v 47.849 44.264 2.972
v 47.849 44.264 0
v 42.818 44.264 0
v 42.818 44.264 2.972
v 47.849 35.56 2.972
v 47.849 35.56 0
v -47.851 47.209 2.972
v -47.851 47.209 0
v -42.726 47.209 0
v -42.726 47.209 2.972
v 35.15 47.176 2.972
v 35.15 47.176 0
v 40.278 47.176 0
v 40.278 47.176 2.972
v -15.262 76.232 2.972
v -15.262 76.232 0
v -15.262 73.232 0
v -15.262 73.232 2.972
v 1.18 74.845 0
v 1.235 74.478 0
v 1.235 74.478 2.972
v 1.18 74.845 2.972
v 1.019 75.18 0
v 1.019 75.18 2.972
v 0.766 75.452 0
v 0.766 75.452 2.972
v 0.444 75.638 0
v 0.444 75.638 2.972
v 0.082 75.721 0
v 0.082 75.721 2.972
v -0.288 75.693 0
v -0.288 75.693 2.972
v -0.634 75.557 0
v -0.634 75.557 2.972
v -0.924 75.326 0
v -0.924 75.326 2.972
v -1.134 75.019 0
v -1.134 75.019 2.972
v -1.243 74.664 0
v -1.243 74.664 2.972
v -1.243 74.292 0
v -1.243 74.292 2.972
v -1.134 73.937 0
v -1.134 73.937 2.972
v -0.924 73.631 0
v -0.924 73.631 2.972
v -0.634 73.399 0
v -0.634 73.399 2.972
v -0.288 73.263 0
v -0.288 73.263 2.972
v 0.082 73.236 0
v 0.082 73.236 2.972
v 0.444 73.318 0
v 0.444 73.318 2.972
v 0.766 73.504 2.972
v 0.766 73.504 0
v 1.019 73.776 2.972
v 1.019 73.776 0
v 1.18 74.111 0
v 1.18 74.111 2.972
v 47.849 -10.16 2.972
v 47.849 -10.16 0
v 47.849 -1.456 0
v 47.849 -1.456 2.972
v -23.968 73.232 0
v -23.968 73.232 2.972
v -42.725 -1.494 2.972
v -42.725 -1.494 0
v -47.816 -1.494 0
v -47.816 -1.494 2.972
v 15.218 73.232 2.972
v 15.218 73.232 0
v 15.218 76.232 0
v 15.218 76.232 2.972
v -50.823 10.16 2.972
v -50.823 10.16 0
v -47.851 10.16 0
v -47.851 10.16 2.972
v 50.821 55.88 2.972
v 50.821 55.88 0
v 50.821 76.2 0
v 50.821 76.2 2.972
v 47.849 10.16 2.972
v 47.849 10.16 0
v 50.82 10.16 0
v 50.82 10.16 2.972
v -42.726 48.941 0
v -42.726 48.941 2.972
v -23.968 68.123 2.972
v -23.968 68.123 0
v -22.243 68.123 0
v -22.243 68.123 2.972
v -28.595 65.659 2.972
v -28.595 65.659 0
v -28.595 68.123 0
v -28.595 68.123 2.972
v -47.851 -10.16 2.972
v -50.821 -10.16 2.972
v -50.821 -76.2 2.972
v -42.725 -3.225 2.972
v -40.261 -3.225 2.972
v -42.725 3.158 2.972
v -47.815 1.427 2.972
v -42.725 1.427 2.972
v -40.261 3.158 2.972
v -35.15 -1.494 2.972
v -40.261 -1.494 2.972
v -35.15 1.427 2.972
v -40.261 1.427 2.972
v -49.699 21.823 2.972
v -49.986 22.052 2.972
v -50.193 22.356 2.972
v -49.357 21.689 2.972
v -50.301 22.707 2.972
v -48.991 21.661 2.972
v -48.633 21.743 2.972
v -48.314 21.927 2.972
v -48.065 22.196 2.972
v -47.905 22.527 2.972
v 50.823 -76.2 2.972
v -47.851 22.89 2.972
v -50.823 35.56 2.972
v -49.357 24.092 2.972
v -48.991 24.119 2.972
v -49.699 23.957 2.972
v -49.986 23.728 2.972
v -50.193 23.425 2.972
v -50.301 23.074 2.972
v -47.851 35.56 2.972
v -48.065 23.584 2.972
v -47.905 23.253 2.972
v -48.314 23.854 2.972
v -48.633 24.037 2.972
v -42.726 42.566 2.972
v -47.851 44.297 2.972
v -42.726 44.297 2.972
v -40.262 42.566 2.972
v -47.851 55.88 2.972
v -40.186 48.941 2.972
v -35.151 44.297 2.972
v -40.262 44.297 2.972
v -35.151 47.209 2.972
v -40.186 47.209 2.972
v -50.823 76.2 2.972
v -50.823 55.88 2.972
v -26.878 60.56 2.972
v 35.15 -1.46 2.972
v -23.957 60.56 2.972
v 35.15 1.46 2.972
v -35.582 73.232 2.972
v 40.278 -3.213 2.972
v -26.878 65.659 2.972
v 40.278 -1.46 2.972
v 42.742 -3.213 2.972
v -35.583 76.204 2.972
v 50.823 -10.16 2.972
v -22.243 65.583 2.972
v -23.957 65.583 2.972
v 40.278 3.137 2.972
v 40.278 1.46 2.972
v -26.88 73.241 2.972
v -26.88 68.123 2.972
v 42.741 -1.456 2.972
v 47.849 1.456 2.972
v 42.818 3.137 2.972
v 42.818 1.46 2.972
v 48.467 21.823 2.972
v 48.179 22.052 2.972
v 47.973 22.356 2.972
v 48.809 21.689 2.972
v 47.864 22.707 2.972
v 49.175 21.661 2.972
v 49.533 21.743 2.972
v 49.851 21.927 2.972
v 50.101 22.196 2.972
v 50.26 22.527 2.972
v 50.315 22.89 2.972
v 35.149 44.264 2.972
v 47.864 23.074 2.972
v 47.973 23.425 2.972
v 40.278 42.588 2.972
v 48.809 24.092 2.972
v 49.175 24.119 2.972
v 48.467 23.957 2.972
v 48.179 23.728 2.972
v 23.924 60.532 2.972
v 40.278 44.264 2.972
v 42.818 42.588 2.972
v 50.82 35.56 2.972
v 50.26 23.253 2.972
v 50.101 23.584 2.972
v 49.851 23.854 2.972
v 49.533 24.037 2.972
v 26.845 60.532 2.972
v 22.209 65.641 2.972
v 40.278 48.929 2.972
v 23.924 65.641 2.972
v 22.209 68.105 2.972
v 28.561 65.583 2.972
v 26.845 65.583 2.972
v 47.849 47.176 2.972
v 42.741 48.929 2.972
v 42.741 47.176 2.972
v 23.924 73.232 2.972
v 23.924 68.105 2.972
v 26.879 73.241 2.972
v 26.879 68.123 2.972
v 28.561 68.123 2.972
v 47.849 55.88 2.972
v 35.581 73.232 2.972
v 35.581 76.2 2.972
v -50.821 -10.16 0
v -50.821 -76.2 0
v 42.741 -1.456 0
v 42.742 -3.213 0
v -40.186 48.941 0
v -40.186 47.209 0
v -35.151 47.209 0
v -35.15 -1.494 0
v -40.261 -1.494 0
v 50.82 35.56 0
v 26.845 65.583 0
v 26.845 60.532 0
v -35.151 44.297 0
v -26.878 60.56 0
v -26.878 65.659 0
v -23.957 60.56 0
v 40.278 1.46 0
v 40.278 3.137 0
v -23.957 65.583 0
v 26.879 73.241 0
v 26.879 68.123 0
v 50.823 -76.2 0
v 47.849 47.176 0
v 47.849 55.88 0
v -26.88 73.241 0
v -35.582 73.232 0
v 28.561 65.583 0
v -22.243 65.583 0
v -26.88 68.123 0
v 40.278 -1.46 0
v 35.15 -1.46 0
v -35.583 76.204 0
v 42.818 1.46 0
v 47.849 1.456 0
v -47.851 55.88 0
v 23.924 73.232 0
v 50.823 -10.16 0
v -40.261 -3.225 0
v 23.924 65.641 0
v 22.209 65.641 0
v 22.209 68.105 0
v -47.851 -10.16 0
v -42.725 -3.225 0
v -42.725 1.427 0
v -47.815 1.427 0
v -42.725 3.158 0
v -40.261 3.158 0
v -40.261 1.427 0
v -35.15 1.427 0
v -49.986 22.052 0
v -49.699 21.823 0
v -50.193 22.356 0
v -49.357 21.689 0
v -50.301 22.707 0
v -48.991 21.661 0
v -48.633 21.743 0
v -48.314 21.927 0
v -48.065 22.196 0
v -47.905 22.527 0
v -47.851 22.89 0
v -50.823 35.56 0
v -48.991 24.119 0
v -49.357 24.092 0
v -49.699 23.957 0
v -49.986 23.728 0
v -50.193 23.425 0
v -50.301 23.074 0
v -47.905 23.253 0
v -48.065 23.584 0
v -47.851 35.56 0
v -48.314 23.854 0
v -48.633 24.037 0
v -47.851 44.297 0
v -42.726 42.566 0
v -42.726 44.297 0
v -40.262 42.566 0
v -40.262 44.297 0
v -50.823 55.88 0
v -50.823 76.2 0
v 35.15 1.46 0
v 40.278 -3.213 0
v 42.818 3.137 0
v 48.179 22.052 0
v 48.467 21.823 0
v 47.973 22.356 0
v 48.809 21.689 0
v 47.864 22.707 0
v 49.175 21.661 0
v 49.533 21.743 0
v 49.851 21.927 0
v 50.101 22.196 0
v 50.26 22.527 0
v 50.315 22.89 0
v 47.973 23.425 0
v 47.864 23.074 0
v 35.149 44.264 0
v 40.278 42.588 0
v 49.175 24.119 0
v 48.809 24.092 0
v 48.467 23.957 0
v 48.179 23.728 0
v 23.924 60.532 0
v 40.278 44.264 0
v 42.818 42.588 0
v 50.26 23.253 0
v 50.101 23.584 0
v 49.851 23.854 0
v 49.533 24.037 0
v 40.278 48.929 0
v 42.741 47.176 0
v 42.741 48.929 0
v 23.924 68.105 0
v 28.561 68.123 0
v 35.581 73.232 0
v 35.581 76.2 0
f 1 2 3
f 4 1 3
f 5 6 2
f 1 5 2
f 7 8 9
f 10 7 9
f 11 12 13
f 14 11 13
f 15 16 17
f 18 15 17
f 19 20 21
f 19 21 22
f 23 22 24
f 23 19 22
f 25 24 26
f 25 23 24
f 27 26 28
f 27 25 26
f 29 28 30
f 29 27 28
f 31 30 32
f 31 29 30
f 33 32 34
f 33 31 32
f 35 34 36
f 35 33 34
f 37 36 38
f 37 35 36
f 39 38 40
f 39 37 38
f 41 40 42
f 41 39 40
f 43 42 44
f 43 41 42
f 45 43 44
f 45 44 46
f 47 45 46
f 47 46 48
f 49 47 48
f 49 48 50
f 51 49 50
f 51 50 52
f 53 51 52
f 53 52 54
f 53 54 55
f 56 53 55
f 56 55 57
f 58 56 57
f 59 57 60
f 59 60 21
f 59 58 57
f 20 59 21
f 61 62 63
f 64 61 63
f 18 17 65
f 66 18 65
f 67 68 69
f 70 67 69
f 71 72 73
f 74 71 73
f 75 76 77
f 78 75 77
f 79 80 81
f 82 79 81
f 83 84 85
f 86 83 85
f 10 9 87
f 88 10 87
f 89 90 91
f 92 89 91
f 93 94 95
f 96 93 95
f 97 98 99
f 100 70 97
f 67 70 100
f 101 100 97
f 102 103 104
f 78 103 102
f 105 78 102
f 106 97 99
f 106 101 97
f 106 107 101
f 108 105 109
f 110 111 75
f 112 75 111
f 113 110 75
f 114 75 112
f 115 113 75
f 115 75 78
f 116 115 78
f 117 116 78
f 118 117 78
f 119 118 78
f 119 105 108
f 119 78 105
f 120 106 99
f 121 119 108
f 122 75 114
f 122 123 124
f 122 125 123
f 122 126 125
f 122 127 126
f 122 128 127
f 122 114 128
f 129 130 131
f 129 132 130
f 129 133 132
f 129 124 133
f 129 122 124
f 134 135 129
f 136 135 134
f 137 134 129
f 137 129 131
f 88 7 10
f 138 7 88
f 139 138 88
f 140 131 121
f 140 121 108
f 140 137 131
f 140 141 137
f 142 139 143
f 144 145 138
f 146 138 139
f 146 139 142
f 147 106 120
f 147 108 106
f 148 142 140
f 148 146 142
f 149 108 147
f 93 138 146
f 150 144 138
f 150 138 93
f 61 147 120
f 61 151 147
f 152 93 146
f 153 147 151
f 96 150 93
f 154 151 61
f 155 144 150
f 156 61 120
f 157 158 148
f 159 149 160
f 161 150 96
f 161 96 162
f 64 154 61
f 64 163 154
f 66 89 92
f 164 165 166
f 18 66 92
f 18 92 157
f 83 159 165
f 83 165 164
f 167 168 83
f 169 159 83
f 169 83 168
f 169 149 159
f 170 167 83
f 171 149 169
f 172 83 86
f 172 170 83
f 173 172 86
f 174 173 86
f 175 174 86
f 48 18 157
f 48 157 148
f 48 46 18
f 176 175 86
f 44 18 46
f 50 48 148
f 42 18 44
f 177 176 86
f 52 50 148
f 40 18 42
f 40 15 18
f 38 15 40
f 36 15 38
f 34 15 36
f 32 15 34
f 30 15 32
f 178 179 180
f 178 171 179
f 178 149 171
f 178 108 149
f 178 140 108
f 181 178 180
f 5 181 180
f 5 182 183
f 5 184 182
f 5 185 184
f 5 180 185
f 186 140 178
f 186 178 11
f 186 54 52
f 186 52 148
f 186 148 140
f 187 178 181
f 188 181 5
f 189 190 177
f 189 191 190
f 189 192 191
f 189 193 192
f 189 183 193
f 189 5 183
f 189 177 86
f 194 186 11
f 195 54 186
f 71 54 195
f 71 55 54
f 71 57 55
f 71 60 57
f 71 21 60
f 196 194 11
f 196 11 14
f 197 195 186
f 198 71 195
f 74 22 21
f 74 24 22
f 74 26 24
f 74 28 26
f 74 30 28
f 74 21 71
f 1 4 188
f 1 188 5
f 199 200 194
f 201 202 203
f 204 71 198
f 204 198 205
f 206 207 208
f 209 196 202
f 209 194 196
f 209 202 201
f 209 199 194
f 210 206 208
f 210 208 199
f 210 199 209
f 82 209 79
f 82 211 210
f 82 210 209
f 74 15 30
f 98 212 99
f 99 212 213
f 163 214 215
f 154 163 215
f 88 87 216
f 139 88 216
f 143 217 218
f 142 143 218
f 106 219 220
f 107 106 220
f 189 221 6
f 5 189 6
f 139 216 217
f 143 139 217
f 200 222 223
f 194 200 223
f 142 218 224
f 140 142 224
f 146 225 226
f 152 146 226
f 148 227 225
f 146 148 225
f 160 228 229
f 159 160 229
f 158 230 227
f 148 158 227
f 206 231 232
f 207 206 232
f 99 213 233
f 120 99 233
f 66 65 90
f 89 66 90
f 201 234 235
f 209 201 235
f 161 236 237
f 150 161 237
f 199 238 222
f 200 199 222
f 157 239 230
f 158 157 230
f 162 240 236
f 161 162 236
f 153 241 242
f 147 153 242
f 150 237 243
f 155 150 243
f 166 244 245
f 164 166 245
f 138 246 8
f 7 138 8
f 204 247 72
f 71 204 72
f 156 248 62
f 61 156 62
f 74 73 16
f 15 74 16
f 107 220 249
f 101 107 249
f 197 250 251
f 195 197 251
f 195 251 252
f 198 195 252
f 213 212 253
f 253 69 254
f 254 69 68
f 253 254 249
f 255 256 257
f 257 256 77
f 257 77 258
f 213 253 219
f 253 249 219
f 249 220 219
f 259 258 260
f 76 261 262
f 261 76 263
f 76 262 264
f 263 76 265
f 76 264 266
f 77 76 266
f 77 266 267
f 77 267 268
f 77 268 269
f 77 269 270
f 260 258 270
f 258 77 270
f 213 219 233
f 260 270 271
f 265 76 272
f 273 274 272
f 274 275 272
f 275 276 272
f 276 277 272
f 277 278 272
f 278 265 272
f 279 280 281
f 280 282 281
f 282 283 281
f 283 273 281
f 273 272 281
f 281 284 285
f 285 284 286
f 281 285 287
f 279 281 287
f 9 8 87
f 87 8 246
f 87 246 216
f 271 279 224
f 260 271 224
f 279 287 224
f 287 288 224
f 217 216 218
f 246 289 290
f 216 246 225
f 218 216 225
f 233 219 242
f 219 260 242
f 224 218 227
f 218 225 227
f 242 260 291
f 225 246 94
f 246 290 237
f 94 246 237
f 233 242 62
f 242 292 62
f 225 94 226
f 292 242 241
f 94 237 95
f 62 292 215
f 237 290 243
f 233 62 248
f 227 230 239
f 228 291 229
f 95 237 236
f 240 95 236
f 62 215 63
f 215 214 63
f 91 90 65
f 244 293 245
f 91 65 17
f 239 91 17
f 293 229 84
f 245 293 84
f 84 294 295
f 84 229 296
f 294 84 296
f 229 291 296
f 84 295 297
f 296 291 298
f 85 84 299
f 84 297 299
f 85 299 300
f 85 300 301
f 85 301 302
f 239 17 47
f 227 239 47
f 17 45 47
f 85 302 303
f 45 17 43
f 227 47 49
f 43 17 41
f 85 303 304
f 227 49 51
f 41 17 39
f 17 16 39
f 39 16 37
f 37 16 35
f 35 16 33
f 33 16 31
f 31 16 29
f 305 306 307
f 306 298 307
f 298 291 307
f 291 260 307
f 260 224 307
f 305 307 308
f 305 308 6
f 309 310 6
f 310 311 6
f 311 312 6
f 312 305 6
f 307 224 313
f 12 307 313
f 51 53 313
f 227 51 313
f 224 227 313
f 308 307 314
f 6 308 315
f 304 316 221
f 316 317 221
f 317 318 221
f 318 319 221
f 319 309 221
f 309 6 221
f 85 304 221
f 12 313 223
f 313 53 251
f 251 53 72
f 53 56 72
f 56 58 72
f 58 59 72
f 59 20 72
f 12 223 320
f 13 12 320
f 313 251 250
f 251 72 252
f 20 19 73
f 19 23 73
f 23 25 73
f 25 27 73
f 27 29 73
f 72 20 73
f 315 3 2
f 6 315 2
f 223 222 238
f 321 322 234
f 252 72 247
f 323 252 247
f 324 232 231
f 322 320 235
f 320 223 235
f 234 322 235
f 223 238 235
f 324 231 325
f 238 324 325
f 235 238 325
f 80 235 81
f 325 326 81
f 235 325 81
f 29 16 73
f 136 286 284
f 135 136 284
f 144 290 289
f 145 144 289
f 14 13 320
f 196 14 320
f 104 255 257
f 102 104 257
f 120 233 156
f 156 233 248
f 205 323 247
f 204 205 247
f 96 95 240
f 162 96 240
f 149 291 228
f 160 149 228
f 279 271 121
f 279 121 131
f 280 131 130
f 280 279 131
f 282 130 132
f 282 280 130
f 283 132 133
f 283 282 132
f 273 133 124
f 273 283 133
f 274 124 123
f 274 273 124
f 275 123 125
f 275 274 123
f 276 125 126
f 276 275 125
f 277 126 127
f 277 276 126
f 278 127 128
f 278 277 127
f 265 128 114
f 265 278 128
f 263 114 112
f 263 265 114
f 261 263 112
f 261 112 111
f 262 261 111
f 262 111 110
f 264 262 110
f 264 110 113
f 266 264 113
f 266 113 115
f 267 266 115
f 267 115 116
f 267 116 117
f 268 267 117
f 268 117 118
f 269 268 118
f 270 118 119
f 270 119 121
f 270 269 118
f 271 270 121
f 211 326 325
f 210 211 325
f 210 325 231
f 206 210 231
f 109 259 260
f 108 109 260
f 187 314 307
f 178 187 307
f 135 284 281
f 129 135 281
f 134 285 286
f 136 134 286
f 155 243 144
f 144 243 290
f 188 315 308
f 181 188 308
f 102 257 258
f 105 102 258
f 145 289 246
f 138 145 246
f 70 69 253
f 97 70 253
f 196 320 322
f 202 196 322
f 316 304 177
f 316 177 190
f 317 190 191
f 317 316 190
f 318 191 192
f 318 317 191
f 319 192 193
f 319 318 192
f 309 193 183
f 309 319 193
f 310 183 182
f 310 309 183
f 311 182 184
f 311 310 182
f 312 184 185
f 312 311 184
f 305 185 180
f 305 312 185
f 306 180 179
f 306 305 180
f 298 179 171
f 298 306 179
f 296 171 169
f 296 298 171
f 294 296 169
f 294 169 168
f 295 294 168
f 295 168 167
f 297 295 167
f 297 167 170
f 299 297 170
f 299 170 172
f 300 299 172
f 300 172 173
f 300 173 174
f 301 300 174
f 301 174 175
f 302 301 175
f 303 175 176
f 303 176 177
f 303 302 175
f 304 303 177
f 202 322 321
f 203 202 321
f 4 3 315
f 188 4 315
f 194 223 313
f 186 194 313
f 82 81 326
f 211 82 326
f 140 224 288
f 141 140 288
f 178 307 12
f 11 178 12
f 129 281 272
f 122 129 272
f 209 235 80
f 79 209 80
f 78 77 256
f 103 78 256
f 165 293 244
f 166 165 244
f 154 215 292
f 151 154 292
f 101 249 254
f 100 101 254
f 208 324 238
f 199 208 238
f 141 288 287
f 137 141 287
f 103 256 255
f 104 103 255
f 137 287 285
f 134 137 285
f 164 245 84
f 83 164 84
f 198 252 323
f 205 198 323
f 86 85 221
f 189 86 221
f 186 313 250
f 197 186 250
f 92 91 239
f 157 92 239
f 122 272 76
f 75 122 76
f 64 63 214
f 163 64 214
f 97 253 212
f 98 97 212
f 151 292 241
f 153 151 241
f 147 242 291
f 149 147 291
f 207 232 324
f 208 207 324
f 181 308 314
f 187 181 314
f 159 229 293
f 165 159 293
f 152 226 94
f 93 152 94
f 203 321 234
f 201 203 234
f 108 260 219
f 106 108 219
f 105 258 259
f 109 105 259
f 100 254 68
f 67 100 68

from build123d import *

# Parameters (mm, degrees)
F0_R     = 1.23227
F0_R_2   = 1.246014
F1_DEPTH = 2.9718


with BuildPart() as f1:
    # F0 (on Top) → F1 (new body)
    with BuildSketch(Plane.XY):
        Polygon((-50.820782, -76.199999), (50.822706, -76.199999), (50.822706, -10.159999), (47.848982, -10.159999), (47.848982, -4.600307), (47.848982, -1.456227), (42.741386, -1.456227), (42.741967, -3.213268), (40.278167, -3.213268), (40.278167, -1.4605), (35.149562, -1.4605), (35.149562, 0), (35.149562, 1.4605), (40.278167, 1.4605), (40.278167, 3.136732), (42.818167, 3.136732), (42.818167, 1.4605), (47.848982, 1.456228), (47.848982, 10.160001), (50.82015, 10.160001), (50.82015, 35.559999), (47.848982, 35.559999), (47.848982, 44.263772), (42.817586, 44.263772), (42.817586, 42.58754), (40.277586, 42.58754), (40.277586, 44.263772), (35.148982, 44.263772), (35.149562, 47.176227), (40.277586, 47.176227), (40.277586, 48.928995), (42.741386, 48.928995), (42.741386, 47.176227), (47.848982, 47.176227), (47.848982, 55.879999), (50.820782, 55.879999), (50.820782, 76.199999), (35.580782, 76.199999), (35.580782, 73.232112), (26.879027, 73.241051), (26.879027, 68.122951), (28.561365, 68.122951), (28.561365, 65.582951), (26.844848, 65.582951), (26.844848, 60.532112), (25.384348, 60.532112), (23.923848, 60.532112), (23.923848, 65.641274), (22.209348, 65.641274), (22.209348, 68.105074), (23.923848, 68.105074), (23.923848, 73.232112), (15.218057, 73.232112), (15.218057, 76.232044), (-0.021943, 76.232044), (-15.261943, 76.232044), (-15.261943, 73.232112), (-23.967733, 73.232112), (-23.967733, 68.122951), (-22.24267, 68.122951), (-22.24267, 65.582951), (-23.95717, 65.582951), (-23.95717, 60.560244), (-25.41767, 60.560244), (-26.87817, 60.560244), (-26.87817, 65.659151), (-28.594688, 65.659151), (-28.594688, 68.122951), (-26.880188, 68.122951), (-26.880188, 73.241051), (-35.581943, 73.232112), (-35.582706, 76.203912), (-50.822706, 76.199999), (-50.822706, 55.879999), (-47.850906, 55.879999), (-47.850906, 47.209491), (-42.726061, 47.209491), (-42.726061, 48.940623), (-40.186061, 48.940623), (-40.186061, 47.209491), (-35.150906, 47.209491), (-35.150906, 45.757536), (-35.150906, 44.297036), (-40.262261, 44.297036), (-40.262261, 42.565904), (-42.726061, 42.565904), (-42.726061, 44.297036), (-47.850906, 44.297036), (-47.850906, 35.559999), (-50.822706, 35.559999), (-50.822706, 10.159999), (-47.850906, 10.159999), (-47.815394, 1.427236), (-42.724717, 1.427236), (-42.724717, 3.158368), (-40.260917, 3.158368), (-40.260917, 1.427236), (-35.149562, 1.427236), (-35.149562, -0.033264), (-35.149562, -1.493764), (-40.260917, -1.493764), (-40.260917, -3.224896), (-42.724717, -3.224896), (-42.724717, -1.493764), (-47.815546, -1.493764), (-47.850906, -10.159999), (-50.820782, -10.159999), align=None)
        with Locations((-49.082806, 22.89018)):
            Circle(F0_R, mode=Mode.SUBTRACT)
        with Locations((-0.010971, 74.478078)):
            Circle(F0_R_2, mode=Mode.SUBTRACT)
        with Locations((49.082806, 22.89018)):
            Circle(F0_R, mode=Mode.SUBTRACT)
    extrude(amount=F1_DEPTH)


solid = f1.part
